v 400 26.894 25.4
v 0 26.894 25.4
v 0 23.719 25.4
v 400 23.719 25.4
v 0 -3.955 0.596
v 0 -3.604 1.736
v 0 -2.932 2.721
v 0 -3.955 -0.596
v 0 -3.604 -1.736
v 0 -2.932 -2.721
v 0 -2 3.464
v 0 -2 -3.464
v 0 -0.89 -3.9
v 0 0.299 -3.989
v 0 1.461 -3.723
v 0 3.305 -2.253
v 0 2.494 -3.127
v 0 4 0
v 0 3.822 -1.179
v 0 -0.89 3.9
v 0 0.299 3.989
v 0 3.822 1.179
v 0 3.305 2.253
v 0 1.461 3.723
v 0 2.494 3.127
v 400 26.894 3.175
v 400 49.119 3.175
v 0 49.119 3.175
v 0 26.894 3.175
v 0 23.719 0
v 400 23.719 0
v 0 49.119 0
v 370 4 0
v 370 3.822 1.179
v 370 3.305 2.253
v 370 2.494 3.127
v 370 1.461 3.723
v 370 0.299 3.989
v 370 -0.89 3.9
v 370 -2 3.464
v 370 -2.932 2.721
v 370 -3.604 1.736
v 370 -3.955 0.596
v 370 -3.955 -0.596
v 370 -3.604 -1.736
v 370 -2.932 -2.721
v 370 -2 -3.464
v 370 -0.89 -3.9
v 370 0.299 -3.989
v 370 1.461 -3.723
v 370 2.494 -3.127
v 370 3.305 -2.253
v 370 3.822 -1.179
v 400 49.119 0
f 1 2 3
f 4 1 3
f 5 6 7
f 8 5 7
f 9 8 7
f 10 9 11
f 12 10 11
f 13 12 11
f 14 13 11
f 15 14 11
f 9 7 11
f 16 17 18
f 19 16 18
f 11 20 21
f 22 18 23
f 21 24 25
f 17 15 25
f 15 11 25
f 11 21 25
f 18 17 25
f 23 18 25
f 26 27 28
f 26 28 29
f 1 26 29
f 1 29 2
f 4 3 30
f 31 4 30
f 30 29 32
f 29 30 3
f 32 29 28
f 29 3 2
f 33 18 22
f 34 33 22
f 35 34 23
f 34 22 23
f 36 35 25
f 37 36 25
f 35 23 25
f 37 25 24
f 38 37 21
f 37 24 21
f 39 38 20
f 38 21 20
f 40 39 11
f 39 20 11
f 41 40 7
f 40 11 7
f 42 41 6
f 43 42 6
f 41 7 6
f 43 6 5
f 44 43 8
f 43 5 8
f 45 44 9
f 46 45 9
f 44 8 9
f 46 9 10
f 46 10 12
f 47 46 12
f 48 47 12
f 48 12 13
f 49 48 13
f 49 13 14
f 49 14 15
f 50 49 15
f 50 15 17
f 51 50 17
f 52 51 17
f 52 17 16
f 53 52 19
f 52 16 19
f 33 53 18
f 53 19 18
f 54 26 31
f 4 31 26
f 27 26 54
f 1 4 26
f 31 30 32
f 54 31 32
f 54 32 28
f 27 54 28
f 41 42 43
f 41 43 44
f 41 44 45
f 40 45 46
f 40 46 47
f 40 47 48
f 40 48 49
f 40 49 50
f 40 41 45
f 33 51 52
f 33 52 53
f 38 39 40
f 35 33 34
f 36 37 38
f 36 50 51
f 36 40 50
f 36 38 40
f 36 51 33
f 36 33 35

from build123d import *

# Parameters (mm, degrees)
F0_R     = 4
F1_DEPTH = 370
F3_DEPTH = 400


with BuildPart() as f1:
    # F0 (on Right) → F1 (new body)
    with BuildSketch(Plane.YZ):
        Circle(F0_R)
    extrude(amount=F1_DEPTH)


with BuildPart() as f3:
    # F2 (on Right) → F3 (new body)
    with BuildSketch(Plane.YZ):
        Polygon((23.718787, 25.4), (23.718787, 0), (49.118787, 0), (49.118787, 3.175), (26.893787, 3.175), (26.893787, 25.4), align=None)
    extrude(amount=F3_DEPTH)


solid = Compound([f1.part, f3.part])
